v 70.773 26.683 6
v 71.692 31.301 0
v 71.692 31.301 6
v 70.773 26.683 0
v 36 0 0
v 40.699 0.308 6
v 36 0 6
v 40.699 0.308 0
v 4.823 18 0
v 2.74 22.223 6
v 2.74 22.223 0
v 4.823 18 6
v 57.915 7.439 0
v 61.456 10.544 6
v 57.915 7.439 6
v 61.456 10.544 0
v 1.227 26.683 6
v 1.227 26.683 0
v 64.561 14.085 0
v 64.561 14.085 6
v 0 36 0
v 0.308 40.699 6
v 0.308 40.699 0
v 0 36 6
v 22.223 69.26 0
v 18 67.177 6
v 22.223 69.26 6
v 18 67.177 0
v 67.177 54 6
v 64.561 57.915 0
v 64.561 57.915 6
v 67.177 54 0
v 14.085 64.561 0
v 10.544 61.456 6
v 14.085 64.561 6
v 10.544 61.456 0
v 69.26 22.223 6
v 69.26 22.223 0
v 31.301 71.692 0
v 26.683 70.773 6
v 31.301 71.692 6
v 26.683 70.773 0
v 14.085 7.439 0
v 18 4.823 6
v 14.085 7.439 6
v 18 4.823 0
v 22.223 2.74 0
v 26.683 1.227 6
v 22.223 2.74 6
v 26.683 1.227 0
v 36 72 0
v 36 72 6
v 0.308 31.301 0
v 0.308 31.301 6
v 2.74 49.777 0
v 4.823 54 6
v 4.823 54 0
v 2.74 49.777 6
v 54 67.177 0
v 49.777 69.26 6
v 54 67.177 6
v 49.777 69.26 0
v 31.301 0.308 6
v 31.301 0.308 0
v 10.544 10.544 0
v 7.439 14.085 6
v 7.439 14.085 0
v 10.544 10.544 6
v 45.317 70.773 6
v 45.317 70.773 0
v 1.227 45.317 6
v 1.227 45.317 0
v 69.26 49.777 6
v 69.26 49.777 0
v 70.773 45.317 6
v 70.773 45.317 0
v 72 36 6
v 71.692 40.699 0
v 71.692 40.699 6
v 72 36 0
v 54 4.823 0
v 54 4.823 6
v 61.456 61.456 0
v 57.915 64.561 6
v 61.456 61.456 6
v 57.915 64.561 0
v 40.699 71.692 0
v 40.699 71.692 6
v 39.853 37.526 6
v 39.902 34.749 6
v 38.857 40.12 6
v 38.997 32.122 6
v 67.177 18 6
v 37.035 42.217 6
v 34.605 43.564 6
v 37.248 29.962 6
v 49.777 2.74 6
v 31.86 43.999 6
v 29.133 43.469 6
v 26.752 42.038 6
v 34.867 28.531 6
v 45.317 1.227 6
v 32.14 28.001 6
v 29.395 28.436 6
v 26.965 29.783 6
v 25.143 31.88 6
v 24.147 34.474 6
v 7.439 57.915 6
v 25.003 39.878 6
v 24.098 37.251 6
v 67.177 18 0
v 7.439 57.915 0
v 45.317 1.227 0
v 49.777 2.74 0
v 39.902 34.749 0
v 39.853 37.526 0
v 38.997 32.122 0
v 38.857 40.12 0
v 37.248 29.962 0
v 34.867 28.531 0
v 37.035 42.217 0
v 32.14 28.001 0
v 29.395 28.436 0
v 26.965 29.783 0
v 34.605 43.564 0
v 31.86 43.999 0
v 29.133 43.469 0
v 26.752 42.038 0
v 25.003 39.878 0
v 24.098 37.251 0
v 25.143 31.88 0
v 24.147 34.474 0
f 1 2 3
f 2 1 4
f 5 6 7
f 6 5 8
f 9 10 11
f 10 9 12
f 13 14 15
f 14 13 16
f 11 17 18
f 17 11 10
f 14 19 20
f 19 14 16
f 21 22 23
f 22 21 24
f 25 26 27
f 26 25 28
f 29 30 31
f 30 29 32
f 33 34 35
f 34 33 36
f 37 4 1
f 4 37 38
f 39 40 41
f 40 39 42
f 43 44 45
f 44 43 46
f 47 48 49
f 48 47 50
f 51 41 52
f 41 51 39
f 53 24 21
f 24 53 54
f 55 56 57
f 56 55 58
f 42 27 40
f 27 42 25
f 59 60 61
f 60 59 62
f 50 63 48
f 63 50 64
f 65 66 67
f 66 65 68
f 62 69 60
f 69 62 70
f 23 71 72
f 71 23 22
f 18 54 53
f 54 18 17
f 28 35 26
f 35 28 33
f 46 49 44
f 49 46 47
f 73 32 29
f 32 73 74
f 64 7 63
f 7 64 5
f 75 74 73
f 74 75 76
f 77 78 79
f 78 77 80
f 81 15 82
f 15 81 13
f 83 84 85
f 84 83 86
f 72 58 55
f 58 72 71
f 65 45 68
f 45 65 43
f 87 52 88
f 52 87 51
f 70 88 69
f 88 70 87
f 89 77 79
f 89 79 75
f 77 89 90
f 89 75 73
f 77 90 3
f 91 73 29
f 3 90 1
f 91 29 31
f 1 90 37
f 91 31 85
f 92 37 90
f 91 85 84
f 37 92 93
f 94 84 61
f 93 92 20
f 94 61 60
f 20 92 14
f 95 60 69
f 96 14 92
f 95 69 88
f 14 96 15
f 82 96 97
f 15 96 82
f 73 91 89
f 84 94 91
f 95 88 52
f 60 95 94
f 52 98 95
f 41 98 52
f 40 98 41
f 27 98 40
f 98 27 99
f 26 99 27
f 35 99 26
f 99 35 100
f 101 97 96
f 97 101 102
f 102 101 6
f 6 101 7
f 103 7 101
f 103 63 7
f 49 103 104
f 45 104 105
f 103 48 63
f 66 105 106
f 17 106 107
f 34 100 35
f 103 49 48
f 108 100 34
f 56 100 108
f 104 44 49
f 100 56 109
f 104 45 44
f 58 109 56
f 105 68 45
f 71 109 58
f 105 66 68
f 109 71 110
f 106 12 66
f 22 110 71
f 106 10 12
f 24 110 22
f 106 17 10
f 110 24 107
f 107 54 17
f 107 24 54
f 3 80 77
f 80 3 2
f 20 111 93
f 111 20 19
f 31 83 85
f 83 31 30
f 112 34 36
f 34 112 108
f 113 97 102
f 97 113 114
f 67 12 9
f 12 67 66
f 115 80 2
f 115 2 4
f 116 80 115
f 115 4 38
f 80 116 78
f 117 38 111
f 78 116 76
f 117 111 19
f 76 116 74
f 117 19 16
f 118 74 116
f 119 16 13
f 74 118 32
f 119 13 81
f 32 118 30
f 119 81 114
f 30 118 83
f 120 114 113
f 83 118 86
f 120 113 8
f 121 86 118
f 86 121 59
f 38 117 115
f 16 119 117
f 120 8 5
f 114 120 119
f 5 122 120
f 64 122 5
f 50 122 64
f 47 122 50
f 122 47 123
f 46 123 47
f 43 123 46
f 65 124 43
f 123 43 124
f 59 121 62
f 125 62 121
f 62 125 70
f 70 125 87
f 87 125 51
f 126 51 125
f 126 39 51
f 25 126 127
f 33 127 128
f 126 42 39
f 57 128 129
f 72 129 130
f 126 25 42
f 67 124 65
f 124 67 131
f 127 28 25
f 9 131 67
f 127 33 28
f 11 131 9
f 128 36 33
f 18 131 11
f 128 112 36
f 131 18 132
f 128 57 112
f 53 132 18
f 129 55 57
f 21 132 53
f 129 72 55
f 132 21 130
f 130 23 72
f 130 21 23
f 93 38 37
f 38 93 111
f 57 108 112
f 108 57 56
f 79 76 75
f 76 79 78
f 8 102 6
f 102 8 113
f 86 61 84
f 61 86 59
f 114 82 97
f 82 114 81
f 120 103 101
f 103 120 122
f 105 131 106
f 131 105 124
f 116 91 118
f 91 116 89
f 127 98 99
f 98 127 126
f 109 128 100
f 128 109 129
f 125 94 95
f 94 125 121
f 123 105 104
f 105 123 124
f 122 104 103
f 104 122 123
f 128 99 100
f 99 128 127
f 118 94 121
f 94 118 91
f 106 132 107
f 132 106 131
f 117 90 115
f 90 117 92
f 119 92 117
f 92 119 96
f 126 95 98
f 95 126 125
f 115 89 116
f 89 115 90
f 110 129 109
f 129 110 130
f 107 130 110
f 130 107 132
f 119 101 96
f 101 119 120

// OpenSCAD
$fn = 32;

// ----------------------------------------------------------------------
// Cam plate: eccentric cam, base R36
// ----------------------------------------------------------------------

// --- parameters (mm) ---
base_r = 36;              // base circle radius
lobe_h = 12;              // cam lobe rise
bore_r = 8;               // shaft bore radius
plate_t = 6;              // plate thickness, Z (extrusion height)
ecc = 4;                  // disc eccentricity

profile = [[72, 36], [71.692, 40.699], [70.773, 45.317], [69.26, 49.777], [67.177, 54], [64.561, 57.915], [61.456, 61.456], [57.915, 64.561], [54, 67.177], [49.777, 69.26], [45.317, 70.773], [40.699, 71.692], [36, 72], [31.301, 71.692], [26.683, 70.773], [22.223, 69.26], [18, 67.177], [14.085, 64.561], [10.544, 61.456], [7.439, 57.915], [4.823, 54], [2.74, 49.777], [1.227, 45.317], [0.308, 40.699], [0, 36], [0.308, 31.301], [1.227, 26.683], [2.74, 22.223], [4.823, 18], [7.439, 14.085], [10.544, 10.544], [14.085, 7.439], [18, 4.823], [22.223, 2.74], [26.683, 1.227], [31.301, 0.308], [36, 0], [40.699, 0.308], [45.317, 1.227], [49.777, 2.74], [54, 4.823], [57.915, 7.439], [61.456, 10.544], [64.561, 14.085], [67.177, 18], [69.26, 22.223], [70.773, 26.683], [71.692, 31.301]];  // primary outline, 48 points, counter clockwise
void_1 = [[39.853, 37.526], [38.857, 40.12], [37.035, 42.217], [34.605, 43.564], [31.86, 43.999], [29.133, 43.469], [26.752, 42.038], [25.003, 39.878], [24.098, 37.251], [24.147, 34.474], [25.143, 31.88], [26.965, 29.783], [29.395, 28.436], [32.14, 28.001], [34.867, 28.531], [37.248, 29.962], [38.997, 32.122], [39.902, 34.749]];  // shaft bore, 18 points

// --- the one profile operation ---
difference() {
  linear_extrude(height = plate_t) polygon(points = profile);
  translate([0, 0, -1])
    linear_extrude(height = plate_t + 2) polygon(points = void_1);
}
